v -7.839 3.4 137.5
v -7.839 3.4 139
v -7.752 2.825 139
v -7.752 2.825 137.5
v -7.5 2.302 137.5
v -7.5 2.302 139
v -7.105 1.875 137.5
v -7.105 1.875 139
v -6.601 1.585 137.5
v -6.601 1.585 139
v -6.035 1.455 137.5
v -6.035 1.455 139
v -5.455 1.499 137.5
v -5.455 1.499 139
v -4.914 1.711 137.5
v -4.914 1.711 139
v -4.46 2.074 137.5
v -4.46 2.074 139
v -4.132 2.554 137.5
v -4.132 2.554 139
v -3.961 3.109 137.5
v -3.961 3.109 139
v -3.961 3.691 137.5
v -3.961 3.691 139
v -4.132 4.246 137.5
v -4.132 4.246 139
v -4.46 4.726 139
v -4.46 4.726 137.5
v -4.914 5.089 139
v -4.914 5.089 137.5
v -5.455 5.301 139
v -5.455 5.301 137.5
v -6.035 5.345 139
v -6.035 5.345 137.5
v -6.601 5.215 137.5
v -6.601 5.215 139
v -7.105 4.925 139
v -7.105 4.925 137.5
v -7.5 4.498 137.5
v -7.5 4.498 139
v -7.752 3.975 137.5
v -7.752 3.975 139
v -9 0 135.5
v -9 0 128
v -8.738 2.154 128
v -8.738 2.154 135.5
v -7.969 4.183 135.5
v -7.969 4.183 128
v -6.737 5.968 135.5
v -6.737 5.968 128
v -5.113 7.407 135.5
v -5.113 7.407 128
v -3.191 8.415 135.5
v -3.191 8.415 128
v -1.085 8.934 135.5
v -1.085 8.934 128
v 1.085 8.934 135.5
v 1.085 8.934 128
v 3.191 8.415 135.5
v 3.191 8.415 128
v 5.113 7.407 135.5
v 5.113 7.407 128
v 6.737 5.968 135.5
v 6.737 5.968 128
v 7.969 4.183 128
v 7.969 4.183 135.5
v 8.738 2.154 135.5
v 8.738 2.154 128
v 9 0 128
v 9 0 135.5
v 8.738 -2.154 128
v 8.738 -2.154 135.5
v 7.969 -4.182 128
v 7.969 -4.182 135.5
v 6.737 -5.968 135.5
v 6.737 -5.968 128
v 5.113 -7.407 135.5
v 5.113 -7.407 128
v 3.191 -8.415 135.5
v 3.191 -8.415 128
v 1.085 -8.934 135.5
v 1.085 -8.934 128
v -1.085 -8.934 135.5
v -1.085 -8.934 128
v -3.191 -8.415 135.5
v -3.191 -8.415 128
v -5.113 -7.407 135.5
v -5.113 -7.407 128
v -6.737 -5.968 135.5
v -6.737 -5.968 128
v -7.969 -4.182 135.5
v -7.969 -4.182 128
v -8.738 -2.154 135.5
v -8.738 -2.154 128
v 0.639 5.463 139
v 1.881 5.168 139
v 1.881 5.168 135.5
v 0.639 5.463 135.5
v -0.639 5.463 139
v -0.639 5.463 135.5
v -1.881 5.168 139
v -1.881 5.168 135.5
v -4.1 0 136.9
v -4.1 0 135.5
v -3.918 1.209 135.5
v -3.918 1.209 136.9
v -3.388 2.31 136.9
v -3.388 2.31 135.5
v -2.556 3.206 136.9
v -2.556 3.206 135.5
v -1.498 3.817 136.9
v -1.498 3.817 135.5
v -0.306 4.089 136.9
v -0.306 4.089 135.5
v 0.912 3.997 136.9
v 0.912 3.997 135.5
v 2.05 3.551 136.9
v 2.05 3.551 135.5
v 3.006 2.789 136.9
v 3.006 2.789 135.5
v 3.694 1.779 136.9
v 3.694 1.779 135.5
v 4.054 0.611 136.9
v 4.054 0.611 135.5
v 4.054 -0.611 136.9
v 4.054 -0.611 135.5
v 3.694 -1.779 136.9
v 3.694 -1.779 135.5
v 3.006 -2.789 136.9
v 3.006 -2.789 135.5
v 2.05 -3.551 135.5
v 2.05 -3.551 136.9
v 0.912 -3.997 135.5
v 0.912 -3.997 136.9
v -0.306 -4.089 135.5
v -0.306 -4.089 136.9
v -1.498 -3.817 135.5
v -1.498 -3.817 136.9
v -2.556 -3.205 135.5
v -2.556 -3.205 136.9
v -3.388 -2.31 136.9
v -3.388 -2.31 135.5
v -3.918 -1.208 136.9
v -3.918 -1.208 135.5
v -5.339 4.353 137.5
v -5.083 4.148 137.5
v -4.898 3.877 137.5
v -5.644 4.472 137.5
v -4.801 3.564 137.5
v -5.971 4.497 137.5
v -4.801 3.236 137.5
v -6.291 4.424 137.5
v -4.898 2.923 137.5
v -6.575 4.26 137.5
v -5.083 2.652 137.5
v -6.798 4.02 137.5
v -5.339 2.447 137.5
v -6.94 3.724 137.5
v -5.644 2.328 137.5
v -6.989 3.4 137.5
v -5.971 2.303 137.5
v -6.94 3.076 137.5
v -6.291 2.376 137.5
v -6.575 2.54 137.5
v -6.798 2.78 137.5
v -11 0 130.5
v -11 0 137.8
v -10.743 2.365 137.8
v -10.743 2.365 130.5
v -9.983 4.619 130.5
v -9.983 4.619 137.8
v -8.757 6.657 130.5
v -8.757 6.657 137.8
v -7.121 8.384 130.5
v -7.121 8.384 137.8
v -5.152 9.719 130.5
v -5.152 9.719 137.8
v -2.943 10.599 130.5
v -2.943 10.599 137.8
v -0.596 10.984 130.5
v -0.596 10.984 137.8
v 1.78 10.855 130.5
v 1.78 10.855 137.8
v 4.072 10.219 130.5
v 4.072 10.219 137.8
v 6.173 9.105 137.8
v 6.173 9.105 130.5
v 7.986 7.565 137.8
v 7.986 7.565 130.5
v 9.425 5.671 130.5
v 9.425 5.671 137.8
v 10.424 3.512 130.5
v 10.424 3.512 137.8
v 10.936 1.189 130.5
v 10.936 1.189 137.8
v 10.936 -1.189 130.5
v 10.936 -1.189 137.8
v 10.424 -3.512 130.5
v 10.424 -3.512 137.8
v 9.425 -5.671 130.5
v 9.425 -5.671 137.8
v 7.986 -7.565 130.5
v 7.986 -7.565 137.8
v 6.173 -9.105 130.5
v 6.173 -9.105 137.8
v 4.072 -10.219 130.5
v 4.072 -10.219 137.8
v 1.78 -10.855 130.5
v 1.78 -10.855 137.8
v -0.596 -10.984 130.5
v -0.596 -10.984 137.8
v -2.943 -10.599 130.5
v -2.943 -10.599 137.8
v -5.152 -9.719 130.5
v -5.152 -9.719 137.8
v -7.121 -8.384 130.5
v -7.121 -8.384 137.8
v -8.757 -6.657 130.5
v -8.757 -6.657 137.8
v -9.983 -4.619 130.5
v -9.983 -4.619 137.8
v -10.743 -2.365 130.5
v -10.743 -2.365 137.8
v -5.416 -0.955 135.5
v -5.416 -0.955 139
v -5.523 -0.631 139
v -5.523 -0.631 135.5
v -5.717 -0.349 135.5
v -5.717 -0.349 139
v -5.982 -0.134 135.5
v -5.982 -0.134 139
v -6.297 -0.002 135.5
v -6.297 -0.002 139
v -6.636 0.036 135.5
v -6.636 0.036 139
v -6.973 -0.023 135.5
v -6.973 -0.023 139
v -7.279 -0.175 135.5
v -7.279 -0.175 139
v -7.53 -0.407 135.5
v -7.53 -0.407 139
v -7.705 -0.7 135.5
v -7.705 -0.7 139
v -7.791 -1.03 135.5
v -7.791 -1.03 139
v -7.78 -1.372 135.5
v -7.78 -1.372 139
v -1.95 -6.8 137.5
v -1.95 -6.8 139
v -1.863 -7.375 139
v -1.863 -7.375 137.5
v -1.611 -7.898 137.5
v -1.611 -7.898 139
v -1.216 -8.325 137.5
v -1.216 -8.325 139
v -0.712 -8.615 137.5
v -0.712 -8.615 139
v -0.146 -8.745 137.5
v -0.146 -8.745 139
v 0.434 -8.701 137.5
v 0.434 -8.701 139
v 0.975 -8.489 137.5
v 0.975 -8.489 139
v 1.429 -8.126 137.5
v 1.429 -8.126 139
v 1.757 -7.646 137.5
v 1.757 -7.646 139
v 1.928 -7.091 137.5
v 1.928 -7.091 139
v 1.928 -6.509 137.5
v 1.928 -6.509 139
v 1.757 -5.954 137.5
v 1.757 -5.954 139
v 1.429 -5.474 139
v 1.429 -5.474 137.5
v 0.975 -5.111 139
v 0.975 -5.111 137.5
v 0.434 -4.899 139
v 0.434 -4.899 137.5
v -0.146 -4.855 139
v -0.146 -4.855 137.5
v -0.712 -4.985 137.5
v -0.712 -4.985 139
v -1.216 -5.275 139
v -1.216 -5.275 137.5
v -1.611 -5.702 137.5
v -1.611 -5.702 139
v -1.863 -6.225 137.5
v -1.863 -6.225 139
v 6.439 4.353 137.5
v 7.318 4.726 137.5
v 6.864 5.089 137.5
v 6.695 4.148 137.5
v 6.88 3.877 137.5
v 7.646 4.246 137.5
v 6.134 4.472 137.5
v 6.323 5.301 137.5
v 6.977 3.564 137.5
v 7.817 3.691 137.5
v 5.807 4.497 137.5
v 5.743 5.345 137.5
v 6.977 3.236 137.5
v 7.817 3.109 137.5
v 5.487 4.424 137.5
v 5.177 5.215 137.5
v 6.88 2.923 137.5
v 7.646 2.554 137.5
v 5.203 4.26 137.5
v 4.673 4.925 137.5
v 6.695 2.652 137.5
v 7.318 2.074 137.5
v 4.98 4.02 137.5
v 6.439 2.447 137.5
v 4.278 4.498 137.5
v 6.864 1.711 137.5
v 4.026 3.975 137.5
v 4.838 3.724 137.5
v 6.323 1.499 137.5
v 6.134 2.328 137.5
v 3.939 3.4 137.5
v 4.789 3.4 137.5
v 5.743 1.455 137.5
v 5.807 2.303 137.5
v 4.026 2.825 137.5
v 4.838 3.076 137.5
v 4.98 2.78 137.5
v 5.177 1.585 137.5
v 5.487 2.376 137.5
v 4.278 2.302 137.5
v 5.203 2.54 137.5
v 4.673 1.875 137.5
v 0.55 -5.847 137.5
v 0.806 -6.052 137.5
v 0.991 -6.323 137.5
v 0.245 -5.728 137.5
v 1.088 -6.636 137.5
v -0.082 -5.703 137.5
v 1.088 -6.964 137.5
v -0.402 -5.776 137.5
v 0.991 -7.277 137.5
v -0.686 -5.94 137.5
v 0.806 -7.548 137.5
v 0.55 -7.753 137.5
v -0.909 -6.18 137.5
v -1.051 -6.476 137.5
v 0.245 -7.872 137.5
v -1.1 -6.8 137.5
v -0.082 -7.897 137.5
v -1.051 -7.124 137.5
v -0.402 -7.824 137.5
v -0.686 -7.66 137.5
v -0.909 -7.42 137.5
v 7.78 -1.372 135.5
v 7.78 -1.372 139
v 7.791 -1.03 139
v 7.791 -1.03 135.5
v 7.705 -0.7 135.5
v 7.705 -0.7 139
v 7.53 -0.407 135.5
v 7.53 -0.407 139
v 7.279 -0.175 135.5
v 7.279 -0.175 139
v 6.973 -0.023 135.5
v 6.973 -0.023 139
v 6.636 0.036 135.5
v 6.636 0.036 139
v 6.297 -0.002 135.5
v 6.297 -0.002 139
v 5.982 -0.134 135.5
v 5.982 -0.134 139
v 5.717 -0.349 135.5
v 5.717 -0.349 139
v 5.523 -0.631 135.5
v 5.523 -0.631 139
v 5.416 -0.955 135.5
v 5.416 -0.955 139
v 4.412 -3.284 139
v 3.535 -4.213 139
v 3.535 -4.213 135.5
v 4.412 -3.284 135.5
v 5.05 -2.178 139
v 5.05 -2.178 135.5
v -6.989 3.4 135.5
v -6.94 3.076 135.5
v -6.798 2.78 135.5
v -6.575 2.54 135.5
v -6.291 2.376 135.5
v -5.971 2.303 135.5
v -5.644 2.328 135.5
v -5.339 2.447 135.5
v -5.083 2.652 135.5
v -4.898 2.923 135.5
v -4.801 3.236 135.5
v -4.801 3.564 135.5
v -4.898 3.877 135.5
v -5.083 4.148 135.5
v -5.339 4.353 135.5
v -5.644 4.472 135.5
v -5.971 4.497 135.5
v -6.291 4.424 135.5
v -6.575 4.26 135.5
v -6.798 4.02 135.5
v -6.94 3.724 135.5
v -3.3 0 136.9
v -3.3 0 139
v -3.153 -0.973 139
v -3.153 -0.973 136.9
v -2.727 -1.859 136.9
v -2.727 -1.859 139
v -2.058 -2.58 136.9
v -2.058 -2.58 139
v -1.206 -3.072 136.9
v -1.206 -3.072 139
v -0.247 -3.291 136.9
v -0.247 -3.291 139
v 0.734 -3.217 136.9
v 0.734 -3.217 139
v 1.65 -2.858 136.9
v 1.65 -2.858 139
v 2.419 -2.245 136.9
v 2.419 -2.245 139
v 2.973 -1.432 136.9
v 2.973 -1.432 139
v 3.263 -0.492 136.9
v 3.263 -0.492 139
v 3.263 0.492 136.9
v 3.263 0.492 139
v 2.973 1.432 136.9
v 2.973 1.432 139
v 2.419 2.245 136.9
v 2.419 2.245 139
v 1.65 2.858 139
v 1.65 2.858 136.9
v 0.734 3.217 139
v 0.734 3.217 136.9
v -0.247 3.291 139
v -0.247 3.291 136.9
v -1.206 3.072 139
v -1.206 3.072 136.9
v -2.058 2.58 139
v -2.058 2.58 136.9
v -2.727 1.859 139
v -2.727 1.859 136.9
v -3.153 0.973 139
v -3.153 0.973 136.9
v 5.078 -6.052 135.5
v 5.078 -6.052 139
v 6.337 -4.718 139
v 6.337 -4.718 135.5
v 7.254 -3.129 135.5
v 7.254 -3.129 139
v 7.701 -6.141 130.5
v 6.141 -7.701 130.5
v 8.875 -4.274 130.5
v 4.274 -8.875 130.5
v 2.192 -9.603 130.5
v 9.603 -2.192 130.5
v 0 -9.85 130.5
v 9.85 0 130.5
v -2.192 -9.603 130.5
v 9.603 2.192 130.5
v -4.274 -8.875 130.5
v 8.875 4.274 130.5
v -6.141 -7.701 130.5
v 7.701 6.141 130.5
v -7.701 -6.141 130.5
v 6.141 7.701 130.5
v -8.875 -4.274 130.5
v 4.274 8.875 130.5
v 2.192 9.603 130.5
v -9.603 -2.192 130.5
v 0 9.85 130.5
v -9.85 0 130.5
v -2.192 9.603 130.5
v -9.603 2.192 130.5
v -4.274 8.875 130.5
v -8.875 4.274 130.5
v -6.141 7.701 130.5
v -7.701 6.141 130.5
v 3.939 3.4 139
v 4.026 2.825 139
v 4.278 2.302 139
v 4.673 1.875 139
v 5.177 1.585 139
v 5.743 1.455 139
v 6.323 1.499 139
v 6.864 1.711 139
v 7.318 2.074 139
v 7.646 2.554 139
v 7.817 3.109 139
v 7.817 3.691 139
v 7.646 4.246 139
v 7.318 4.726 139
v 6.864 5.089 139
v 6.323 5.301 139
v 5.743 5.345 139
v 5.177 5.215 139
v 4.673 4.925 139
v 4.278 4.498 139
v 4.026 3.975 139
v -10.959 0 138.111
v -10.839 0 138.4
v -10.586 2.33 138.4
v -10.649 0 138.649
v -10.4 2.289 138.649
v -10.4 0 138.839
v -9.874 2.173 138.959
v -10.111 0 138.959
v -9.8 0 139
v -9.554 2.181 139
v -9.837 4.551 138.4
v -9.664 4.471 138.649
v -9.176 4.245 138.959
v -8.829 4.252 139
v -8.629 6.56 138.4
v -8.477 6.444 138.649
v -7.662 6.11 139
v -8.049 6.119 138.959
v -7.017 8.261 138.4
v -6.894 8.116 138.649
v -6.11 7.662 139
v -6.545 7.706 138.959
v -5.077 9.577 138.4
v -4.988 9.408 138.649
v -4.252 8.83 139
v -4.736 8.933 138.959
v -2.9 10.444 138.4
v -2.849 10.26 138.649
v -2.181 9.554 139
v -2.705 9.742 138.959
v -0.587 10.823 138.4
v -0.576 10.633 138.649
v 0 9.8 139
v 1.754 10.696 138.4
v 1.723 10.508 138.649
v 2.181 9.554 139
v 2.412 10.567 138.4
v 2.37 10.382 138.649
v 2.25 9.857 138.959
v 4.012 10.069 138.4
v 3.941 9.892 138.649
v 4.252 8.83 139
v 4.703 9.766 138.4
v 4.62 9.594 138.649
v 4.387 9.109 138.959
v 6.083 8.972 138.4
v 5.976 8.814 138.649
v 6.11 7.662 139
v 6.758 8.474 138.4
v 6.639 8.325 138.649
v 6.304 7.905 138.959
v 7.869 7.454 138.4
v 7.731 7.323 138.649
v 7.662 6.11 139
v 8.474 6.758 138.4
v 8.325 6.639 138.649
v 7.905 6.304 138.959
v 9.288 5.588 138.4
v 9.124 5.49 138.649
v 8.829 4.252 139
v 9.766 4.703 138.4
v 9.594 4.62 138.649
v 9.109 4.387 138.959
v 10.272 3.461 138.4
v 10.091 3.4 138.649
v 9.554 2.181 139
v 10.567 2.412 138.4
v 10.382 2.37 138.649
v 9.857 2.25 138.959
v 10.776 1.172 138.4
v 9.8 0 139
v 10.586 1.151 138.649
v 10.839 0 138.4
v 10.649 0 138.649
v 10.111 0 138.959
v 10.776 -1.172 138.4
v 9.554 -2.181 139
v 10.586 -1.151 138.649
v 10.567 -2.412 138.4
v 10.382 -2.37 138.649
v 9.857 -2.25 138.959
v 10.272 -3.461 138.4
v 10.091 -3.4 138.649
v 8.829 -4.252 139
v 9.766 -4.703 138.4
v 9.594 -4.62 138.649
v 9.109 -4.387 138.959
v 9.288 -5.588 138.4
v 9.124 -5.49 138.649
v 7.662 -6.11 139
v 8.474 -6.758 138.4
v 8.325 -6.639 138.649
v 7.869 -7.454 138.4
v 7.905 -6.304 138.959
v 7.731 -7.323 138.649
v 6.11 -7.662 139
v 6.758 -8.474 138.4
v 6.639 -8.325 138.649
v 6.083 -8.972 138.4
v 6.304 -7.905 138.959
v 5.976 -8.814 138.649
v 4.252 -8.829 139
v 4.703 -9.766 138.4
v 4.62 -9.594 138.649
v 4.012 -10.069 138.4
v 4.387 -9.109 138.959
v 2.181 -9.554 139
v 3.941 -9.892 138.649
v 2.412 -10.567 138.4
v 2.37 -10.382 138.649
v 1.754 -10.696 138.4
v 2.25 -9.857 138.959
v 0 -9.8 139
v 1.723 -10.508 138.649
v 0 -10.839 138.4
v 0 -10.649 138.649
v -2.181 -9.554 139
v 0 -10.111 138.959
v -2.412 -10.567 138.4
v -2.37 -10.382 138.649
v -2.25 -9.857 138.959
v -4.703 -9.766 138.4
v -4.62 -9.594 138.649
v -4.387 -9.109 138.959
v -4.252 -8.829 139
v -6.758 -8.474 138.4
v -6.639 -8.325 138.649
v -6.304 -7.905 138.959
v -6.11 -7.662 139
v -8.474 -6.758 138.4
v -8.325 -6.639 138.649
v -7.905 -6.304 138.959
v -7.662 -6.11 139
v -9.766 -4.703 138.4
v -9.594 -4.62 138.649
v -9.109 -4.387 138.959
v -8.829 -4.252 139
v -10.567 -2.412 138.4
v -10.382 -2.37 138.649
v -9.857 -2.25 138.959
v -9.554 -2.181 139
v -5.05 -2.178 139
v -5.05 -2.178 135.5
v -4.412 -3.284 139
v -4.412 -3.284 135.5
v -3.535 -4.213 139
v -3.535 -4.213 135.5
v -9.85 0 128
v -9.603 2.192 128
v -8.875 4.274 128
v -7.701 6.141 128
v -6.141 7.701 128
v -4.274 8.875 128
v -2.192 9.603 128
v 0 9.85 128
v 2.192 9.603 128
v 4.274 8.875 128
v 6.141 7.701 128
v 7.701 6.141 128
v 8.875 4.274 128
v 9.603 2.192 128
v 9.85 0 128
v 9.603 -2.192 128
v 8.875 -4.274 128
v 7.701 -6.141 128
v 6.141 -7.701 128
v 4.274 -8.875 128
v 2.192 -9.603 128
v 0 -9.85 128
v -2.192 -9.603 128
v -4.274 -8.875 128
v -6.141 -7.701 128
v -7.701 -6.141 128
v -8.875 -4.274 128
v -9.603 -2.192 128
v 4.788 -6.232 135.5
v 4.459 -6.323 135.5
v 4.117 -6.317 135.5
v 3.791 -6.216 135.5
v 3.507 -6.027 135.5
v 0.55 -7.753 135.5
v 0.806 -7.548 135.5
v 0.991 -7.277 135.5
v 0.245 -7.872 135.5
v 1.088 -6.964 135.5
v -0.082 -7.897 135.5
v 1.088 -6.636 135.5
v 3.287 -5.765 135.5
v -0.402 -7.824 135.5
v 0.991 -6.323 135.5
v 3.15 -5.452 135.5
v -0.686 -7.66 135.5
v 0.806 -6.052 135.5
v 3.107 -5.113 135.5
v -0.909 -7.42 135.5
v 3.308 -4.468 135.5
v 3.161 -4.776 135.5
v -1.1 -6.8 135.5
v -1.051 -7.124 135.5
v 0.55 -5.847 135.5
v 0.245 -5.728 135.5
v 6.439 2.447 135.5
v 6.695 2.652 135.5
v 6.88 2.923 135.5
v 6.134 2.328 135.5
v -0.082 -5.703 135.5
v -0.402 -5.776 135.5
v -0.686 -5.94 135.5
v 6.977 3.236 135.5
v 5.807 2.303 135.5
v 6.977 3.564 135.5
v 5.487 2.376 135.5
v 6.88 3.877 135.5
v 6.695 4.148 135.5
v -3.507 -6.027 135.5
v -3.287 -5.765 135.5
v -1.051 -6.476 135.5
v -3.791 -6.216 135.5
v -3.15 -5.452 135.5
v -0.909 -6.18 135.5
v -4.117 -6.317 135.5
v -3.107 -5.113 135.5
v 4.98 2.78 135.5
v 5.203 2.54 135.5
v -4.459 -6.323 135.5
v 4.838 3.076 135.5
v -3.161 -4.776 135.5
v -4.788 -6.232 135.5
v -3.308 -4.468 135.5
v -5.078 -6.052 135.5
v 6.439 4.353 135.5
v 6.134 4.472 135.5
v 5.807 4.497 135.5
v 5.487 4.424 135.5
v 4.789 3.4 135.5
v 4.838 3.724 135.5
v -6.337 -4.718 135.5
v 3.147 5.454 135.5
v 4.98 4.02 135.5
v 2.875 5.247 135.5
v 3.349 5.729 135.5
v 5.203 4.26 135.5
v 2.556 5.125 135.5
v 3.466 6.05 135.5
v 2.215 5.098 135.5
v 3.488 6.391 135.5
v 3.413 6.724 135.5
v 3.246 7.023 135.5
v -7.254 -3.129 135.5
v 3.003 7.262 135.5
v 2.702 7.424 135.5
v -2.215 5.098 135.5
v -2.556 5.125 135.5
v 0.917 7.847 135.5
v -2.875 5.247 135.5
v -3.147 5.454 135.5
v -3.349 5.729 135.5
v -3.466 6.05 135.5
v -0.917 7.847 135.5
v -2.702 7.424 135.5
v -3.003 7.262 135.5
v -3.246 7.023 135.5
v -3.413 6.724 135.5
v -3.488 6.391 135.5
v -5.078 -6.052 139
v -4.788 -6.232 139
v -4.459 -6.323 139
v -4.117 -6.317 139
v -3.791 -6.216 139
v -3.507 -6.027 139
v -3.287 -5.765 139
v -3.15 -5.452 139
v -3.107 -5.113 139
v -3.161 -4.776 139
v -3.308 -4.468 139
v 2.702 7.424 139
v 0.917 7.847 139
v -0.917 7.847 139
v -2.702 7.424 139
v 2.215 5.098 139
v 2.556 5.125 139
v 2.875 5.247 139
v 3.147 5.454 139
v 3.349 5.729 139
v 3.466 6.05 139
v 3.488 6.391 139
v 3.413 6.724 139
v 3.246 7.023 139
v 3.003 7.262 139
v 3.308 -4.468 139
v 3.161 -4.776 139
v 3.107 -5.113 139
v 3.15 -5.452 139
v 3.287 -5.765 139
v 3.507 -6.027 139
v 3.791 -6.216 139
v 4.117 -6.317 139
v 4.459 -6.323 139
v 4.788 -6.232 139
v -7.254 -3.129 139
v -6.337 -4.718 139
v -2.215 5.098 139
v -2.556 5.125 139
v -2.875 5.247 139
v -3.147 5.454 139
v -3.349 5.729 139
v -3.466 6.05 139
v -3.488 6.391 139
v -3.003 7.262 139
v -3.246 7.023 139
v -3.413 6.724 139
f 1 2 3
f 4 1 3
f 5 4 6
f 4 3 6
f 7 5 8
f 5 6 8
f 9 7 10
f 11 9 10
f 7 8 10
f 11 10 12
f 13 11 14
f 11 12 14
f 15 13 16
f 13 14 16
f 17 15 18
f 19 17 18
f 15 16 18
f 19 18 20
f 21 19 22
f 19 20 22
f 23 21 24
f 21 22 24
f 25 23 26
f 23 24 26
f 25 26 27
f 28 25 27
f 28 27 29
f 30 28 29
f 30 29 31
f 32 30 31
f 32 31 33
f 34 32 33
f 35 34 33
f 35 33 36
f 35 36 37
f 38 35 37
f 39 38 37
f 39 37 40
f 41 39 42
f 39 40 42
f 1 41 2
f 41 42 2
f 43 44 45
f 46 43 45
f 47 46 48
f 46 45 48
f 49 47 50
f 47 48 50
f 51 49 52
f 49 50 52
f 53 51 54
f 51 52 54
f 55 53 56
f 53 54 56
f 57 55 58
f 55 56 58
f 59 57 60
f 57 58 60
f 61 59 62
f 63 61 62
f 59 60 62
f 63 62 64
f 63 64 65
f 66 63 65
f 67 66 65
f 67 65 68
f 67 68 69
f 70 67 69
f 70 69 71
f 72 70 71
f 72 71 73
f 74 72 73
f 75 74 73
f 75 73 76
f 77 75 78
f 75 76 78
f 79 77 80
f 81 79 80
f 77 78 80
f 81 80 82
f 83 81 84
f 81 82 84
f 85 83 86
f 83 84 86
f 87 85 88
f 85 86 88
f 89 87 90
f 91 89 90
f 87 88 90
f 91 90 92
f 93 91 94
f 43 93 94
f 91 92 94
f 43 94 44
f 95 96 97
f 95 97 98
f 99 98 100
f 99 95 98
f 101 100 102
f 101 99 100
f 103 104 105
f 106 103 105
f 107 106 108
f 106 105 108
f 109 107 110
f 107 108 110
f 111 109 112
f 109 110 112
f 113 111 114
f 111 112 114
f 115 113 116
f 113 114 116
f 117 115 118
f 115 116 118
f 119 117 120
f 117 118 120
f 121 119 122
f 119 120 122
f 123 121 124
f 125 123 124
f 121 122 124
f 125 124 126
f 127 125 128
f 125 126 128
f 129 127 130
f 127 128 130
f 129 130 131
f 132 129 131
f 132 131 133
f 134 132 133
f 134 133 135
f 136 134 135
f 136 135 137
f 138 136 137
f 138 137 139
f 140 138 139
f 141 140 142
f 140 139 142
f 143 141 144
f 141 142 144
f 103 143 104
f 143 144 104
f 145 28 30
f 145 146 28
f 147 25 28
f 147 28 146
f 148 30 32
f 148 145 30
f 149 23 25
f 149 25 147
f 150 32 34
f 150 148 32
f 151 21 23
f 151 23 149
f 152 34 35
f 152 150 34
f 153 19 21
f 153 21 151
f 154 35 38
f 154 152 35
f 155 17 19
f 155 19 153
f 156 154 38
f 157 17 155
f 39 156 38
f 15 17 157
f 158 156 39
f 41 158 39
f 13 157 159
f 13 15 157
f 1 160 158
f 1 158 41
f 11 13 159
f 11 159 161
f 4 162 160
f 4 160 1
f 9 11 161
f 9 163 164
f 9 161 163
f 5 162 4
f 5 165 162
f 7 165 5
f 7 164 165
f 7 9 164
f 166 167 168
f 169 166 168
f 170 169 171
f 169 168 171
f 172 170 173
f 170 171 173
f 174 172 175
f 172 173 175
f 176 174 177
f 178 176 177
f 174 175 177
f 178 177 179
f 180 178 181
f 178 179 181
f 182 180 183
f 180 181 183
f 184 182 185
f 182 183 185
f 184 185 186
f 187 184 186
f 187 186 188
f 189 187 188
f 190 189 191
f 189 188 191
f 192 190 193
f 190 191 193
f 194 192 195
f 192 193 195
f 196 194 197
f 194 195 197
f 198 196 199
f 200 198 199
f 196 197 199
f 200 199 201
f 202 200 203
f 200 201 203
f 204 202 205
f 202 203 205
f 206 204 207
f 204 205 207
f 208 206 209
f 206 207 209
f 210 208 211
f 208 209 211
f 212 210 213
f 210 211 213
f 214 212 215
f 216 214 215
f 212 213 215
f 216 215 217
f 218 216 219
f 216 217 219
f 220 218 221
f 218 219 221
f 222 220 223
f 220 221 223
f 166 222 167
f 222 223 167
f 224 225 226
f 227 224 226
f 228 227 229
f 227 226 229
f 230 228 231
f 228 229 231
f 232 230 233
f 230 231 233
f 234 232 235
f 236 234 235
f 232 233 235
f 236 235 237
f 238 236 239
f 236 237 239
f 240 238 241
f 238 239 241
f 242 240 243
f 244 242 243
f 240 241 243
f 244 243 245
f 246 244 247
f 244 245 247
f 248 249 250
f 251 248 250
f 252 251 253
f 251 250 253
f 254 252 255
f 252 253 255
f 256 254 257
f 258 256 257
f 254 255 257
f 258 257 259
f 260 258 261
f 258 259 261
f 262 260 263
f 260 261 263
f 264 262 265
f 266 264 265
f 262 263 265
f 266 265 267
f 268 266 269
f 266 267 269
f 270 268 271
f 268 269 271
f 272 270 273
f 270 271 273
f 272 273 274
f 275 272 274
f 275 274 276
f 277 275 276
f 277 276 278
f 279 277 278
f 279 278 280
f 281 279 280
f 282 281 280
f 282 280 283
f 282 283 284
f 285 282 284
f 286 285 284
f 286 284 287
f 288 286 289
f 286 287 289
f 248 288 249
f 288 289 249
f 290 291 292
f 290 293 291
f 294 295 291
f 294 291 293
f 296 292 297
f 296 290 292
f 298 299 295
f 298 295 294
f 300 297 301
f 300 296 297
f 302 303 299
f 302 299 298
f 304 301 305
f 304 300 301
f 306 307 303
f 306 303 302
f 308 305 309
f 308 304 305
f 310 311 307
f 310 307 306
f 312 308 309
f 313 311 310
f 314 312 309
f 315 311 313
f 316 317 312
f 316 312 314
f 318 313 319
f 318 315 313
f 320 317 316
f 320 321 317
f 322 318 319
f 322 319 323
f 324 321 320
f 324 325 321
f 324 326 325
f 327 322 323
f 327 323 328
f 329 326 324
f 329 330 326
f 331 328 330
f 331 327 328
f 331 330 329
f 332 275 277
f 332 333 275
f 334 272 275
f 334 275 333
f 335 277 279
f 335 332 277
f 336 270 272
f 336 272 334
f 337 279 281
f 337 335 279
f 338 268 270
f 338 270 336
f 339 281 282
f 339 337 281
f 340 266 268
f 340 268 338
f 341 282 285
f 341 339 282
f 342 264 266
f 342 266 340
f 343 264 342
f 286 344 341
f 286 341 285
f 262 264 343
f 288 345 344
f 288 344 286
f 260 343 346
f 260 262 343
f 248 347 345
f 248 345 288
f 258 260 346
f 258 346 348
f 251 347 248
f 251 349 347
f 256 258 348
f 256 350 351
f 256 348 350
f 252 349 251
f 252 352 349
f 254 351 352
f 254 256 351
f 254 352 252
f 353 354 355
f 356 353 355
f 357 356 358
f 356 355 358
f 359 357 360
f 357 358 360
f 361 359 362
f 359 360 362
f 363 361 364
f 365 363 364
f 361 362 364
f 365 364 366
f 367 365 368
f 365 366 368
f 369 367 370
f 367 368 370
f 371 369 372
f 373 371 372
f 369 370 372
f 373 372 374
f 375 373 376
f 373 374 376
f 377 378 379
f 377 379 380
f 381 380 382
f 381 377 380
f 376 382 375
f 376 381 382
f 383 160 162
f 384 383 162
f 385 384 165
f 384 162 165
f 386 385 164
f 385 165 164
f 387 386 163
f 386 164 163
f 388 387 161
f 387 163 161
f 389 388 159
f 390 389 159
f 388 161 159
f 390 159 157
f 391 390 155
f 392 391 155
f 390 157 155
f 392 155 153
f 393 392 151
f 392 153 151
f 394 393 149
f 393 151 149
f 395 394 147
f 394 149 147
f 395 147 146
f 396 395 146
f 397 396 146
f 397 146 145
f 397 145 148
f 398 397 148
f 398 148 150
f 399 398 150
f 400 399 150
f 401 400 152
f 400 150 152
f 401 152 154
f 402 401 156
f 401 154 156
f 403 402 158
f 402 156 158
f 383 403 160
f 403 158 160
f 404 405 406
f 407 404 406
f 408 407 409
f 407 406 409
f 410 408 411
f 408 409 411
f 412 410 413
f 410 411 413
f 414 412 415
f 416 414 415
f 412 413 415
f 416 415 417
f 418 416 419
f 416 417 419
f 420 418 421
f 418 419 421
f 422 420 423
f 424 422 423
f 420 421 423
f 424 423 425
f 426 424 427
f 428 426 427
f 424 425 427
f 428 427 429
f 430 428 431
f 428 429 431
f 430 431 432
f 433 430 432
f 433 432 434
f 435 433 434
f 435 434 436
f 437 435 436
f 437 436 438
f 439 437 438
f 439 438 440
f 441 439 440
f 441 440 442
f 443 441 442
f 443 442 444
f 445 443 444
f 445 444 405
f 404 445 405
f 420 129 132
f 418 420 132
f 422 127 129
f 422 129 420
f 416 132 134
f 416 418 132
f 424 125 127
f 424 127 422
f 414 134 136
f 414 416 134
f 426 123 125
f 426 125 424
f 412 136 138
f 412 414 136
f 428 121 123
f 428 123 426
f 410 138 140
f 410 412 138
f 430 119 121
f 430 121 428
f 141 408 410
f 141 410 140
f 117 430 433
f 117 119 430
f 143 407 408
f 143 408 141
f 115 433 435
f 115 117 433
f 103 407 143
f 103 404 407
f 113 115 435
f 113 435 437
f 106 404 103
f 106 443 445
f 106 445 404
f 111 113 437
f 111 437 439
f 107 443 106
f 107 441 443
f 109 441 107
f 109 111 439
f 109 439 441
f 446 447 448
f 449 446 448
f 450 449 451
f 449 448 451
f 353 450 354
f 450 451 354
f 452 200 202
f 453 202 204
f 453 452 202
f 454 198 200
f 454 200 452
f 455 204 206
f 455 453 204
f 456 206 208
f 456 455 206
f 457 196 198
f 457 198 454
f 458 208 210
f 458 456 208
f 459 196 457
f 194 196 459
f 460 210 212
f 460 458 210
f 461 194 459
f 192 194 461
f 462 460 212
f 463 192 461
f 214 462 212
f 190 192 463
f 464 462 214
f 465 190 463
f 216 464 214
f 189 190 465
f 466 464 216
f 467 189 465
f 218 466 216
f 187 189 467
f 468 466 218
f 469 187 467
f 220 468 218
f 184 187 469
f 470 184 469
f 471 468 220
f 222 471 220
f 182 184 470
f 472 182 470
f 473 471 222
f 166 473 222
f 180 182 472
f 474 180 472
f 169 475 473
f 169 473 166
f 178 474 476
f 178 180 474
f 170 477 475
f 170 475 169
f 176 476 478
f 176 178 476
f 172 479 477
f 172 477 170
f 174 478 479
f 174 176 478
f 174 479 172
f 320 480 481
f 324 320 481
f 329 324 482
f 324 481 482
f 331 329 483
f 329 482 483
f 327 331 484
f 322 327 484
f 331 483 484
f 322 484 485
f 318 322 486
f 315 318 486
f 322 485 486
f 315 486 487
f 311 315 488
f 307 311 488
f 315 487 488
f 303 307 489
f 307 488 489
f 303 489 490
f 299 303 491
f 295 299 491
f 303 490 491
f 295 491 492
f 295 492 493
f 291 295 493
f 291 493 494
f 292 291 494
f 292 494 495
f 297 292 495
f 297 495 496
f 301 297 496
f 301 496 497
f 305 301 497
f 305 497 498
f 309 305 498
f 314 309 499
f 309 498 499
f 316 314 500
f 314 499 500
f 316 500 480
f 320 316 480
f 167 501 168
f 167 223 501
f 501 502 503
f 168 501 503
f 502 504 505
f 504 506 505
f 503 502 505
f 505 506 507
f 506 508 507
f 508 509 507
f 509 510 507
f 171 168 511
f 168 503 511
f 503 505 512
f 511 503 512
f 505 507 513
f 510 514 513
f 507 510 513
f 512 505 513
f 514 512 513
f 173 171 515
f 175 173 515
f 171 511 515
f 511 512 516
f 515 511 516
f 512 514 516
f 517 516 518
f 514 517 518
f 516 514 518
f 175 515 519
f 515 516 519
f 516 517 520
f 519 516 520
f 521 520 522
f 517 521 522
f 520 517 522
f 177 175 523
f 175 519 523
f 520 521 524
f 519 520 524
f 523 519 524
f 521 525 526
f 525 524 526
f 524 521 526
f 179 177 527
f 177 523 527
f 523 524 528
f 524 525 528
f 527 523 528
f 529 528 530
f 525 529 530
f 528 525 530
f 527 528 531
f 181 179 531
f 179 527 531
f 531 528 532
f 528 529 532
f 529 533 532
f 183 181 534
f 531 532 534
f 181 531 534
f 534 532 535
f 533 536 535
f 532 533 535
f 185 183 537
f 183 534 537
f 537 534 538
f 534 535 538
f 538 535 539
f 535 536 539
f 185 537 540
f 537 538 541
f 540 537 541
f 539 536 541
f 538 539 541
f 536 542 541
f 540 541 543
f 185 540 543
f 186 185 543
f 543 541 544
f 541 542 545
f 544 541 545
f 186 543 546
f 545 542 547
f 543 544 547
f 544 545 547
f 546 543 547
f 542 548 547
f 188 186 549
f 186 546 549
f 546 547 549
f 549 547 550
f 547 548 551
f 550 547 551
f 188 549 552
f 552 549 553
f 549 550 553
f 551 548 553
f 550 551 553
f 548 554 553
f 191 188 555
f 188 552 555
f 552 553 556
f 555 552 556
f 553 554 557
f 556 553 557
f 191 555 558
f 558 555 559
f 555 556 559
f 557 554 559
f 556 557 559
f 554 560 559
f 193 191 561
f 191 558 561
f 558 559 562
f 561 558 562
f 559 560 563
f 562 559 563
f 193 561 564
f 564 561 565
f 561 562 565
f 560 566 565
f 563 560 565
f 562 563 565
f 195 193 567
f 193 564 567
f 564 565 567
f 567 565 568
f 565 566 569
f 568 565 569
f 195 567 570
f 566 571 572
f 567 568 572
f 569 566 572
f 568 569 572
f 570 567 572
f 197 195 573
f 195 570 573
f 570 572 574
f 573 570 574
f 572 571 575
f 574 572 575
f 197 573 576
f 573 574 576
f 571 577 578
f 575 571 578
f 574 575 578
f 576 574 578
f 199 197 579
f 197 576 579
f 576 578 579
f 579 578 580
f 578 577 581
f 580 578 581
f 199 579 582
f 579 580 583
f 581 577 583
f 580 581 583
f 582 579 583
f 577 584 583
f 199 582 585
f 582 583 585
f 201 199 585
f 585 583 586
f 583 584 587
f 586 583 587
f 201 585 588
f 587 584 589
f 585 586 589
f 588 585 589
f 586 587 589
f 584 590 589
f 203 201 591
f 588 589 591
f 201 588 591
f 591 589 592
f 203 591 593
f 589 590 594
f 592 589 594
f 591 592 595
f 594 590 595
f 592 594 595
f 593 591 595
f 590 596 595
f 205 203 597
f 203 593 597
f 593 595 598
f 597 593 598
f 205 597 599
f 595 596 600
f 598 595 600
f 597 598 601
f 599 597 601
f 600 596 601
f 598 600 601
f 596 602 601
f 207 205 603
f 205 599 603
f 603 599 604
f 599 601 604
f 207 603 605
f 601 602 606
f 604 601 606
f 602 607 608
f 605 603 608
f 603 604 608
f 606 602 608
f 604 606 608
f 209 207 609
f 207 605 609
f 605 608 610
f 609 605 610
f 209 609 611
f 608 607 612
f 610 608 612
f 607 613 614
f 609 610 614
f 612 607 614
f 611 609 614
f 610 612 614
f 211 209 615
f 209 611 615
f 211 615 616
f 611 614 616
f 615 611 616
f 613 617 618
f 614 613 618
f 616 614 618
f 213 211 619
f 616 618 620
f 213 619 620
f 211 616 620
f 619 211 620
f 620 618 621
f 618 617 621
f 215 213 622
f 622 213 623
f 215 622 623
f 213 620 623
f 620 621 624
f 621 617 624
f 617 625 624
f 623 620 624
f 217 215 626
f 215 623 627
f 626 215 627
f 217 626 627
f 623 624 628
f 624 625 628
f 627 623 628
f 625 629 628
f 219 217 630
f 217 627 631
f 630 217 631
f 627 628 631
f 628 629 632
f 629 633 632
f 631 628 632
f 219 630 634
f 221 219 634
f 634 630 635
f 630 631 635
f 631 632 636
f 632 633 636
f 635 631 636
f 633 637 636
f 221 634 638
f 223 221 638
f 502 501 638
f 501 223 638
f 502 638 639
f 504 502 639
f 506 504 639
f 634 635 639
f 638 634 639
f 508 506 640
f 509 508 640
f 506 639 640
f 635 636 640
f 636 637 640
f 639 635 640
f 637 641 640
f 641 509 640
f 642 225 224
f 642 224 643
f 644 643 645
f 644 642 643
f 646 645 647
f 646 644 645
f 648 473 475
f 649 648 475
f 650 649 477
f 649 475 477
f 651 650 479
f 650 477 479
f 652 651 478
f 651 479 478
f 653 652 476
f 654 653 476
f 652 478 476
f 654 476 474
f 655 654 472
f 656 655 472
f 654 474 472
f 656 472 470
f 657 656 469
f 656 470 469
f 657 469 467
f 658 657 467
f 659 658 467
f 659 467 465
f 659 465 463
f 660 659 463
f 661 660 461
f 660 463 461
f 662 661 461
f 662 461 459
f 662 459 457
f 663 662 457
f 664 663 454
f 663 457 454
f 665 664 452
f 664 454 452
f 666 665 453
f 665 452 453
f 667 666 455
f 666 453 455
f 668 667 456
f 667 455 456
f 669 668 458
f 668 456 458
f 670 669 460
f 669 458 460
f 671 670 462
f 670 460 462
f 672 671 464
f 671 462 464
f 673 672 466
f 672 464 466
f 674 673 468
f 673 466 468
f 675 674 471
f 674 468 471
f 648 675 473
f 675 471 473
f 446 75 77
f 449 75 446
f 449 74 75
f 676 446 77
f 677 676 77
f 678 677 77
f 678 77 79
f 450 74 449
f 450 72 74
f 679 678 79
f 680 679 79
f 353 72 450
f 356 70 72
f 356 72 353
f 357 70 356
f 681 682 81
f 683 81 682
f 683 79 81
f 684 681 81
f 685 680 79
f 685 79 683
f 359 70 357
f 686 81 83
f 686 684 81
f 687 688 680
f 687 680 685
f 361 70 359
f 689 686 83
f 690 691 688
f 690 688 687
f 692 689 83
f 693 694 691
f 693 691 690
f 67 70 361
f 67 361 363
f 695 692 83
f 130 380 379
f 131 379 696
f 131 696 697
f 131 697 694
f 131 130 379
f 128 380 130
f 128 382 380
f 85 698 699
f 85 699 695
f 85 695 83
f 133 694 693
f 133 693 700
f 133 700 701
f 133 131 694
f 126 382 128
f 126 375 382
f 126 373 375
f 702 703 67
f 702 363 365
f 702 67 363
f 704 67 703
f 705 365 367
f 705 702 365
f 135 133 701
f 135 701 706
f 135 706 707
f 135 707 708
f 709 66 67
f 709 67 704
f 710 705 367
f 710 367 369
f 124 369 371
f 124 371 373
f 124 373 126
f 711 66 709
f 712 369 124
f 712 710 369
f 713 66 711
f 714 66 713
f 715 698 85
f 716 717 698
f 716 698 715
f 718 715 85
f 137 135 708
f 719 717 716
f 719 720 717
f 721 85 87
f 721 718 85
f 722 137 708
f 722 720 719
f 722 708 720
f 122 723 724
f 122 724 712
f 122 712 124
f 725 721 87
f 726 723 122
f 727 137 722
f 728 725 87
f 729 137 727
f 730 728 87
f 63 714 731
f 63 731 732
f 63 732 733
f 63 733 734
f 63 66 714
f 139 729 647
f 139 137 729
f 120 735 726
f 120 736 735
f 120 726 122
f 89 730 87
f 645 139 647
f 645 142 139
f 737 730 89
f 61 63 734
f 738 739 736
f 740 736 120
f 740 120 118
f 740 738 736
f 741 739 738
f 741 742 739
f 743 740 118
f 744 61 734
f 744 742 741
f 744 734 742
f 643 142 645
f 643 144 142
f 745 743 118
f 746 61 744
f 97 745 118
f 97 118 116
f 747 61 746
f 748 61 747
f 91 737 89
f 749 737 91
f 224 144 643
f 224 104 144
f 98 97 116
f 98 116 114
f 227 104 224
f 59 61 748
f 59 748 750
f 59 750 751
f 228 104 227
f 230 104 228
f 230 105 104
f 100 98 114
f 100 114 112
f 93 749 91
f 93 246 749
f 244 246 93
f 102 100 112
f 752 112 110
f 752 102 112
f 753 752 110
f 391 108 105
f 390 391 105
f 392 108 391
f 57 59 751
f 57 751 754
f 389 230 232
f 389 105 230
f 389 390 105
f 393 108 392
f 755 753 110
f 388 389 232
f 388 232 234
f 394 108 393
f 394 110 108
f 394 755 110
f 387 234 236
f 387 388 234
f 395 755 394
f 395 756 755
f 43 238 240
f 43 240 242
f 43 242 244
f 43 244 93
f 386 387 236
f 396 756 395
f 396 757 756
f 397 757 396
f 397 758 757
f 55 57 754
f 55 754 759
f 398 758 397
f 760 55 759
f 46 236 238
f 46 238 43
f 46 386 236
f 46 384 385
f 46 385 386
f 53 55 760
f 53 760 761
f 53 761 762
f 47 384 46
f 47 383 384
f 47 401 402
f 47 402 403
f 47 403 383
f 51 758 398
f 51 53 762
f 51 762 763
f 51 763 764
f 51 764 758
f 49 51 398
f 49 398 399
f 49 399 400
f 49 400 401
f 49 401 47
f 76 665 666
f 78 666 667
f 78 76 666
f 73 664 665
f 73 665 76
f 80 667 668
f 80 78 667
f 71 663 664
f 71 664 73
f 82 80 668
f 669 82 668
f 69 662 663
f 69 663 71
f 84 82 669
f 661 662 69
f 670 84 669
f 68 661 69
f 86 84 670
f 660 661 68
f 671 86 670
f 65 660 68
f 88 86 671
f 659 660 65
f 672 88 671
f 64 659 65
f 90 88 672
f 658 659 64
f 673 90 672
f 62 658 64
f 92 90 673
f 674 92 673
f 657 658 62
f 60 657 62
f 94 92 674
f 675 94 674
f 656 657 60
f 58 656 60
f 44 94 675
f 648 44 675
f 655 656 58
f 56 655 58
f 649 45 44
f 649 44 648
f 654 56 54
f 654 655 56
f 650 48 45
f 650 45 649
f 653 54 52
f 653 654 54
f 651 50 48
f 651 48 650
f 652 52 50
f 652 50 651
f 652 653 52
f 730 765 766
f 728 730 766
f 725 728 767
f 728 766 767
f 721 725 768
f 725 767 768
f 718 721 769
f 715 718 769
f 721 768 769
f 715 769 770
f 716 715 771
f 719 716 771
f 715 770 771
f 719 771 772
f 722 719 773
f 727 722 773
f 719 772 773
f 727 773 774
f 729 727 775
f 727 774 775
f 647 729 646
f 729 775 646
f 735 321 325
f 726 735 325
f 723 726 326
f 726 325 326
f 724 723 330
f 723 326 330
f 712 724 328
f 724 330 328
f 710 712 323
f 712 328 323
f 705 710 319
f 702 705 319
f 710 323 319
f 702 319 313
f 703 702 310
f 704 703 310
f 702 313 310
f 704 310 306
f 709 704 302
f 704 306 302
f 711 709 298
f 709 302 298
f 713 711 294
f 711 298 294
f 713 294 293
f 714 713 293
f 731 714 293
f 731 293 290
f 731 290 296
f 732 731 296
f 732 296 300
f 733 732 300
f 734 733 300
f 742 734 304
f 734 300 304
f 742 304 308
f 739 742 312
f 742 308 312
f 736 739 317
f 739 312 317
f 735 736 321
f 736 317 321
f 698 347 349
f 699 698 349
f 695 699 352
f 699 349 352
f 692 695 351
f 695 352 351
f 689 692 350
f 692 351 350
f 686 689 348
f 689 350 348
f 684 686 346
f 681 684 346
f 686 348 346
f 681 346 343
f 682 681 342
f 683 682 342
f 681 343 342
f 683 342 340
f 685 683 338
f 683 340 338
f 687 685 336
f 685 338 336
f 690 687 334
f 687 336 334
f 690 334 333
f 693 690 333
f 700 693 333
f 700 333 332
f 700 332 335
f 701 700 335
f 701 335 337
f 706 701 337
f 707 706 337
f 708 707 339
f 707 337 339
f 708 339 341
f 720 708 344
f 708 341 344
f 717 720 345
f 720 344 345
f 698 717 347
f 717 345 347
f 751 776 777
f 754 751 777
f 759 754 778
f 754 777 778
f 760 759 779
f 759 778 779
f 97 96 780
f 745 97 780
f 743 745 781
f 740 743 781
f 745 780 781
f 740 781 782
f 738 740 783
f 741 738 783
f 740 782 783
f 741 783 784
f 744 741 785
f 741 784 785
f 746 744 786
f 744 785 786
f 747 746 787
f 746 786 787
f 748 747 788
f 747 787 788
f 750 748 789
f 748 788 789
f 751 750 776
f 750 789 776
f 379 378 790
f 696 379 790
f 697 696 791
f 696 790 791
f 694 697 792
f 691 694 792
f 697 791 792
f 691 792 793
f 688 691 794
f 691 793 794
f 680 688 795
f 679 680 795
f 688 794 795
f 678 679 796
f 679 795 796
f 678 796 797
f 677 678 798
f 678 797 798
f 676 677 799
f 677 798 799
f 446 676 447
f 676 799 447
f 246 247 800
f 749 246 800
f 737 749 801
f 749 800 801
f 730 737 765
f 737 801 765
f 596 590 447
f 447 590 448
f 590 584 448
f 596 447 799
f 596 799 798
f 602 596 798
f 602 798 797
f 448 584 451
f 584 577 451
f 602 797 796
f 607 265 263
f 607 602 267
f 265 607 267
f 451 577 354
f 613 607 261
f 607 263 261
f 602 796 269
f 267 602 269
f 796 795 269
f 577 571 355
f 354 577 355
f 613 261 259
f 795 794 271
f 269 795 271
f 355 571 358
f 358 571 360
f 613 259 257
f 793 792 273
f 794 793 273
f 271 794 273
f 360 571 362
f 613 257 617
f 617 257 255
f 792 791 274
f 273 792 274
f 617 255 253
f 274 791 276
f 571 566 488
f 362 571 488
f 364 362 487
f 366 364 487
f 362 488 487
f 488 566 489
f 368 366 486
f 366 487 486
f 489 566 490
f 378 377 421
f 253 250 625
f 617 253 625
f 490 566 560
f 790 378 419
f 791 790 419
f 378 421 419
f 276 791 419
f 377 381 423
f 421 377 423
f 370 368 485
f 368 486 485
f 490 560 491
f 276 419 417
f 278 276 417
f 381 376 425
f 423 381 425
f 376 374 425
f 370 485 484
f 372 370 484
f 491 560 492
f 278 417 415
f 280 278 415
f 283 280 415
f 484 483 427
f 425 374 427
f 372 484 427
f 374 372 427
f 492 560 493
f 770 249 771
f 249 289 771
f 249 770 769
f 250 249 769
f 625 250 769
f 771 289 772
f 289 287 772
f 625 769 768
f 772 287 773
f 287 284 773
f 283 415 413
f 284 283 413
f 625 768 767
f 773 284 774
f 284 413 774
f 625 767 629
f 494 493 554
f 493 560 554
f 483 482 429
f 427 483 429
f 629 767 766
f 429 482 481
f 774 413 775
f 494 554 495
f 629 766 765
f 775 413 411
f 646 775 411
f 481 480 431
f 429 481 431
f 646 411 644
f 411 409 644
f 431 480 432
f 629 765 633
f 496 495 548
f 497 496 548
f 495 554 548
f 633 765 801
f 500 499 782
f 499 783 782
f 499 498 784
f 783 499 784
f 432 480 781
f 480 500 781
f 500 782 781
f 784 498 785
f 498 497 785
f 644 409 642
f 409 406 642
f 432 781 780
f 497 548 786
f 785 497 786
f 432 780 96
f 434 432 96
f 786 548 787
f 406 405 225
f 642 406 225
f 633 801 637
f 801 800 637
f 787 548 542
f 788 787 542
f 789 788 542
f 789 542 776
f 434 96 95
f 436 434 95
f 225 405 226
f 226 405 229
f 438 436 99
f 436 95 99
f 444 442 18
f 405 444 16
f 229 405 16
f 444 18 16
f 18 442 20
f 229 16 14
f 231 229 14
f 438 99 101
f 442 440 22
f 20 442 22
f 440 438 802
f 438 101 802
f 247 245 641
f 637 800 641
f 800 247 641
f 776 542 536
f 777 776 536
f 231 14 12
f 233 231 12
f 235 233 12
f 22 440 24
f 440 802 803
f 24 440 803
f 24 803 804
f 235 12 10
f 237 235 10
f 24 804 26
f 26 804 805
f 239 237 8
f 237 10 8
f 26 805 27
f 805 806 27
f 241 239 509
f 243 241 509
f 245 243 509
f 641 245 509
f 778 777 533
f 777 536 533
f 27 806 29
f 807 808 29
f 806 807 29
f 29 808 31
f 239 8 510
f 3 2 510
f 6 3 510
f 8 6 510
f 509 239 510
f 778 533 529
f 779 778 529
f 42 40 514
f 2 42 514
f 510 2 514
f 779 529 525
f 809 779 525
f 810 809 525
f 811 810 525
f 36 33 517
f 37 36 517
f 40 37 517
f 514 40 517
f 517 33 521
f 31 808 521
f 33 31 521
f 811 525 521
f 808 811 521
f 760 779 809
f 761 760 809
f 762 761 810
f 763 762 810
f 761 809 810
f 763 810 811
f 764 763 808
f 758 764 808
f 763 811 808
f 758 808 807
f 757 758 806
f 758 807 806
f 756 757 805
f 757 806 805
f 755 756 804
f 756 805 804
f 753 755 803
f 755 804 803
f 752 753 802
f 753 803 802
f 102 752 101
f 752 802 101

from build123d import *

# Parameters (mm, degrees)
SKETCH030_R             = 11
PAD011_DEPTH            = 8.5
SKETCH031_R             = 9.85
PAD012_DEPTH            = 2.5
SKETCH032_R             = 9
POCKET019_DEPTH         = 7.5
SKETCH033_R             = 1.95
POCKET020_DEPTH         = 1.5
FILLET010_R             = 1.2
SKETCH034_R             = 1.1
POCKET021_DEPTH         = 2
SKETCH035_R             = 3.3
POCKET022_DEPTH         = 3.5
SKETCH036_R             = 4.1
POCKET023_DEPTH         = 1.4
BODY011_PLACEMENT_ANGLE = 180.00001


with BuildPart() as part:
    # Sketch030 → Pad011 (new body)
    with BuildSketch(Plane.XY):
        Circle(SKETCH030_R)
    extrude(amount=PAD011_DEPTH)

    # Sketch031 (on Face3 of Pad011) → Pad012 (join)
    with BuildSketch(Plane.XY.offset(8.5)):
        Circle(SKETCH031_R)
    extrude(amount=PAD012_DEPTH)

    # Sketch032 (on Face5 of Pad012) → Pocket019 (cut)
    with BuildSketch(Plane.XY.offset(11)):
        Circle(SKETCH032_R)
    extrude(amount=-POCKET019_DEPTH, mode=Mode.SUBTRACT)

    # Sketch033 (on Face2 of Pocket019) → Pocket020 (cut)
    with BuildSketch(Plane(origin=(0, 0, 0), x_dir=(1, 0, 0), z_dir=(0, 0, -1))):
        with Locations((0, 6.8)):
            Circle(SKETCH033_R)
        with Locations((-5.8889727457, -3.4)):
            Circle(SKETCH033_R)
        with Locations((5.8889727457, -3.4)):
            Circle(SKETCH033_R)
    extrude(amount=-POCKET020_DEPTH, mode=Mode.SUBTRACT)

    # Fillet010
    fillet010_edges = [part.edges().sort_by_distance(p)[0] for p in [
        (-11, 0, 0),
    ]]
    fillet(fillet010_edges, radius=FILLET010_R)

    # Sketch034 (on Face11 of Fillet010) → Pocket021 (cut)
    with BuildSketch(Plane(origin=(0, 0, 1.5), x_dir=(1, 0, 0), z_dir=(0, 0, -1))):
        with Locations((-5.8889727457, -3.4)):
            Circle(SKETCH034_R)
        with Locations((0, 6.8)):
            Circle(SKETCH034_R)
        with Locations((5.8889727457, -3.4)):
            Circle(SKETCH034_R)
    extrude(amount=-POCKET021_DEPTH, mode=Mode.SUBTRACT)

    # Sketch035 (on Face4 of Pocket021) → Pocket022 (cut)
    with BuildSketch(Plane(origin=(0, 0, 0), x_dir=(1, 0, 0), z_dir=(0, 0, -1))):
        Circle(SKETCH035_R)
        with BuildLine():
            ThreePointArc((-3.5353318533, 4.2132444372), (-3.3874236532, 5.9038429005), (-5.0780221165, 6.0517511006))
            ThreePointArc((-5.0780221165, 6.0517511006), (-6.8416006899, 3.95), (-7.7799812488, 1.3718206036))
            ThreePointArc((-7.7799812488, 1.3718206036), (-6.8065897584, -0.0183265132), (-5.4164426416, 0.9550649772))
            ThreePointArc((-3.5353318533, 4.2132444372), (-4.7631397208, 2.75), (-5.4164426416, 0.9550649772))
        make_face()
        with BuildLine():
            ThreePointArc((5.0780221165, 6.0517511006), (3.3874236532, 5.9038429005), (3.5353318533, 4.2132444372))
            ThreePointArc((5.4164426416, 0.9550649772), (4.7631397208, 2.75), (3.5353318533, 4.2132444372))
            ThreePointArc((5.4164426416, 0.9550649772), (6.8065897584, -0.0183265132), (7.7799812488, 1.3718206036))
            ThreePointArc((7.7799812488, 1.3718206036), (6.8416006899, 3.95), (5.0780221165, 6.0517511006))
        make_face()
        with BuildLine():
            ThreePointArc((-1.8811107883, -5.1683094143), (-3.4191661052, -5.8855163873), (-2.7019591323, -7.4235717042))
            ThreePointArc((-2.7019591323, -7.4235717042), (0, -7.9), (2.7019591323, -7.4235717042))
            ThreePointArc((2.7019591323, -7.4235717042), (3.4191661052, -5.8855163873), (1.8811107883, -5.1683094143))
            ThreePointArc((-1.8811107883, -5.1683094143), (0, -5.5), (1.8811107883, -5.1683094143))
        make_face()
    extrude(amount=-POCKET022_DEPTH, mode=Mode.SUBTRACT)

    # Sketch036 (on Face23 of Pocket022) → Pocket023 (cut)
    with BuildSketch(Plane.XY.offset(3.5)):
        Circle(SKETCH036_R)
    extrude(amount=-POCKET023_DEPTH, mode=Mode.SUBTRACT)


with BuildPart() as part_1:
    # Body011 placement: moved
    add(part.part.moved(Location((2.3918e-06, 1e-05, 139.00003))).rotate(Axis((2.3918e-06, 1e-05, 139.00003), (0, 1, 0)), BODY011_PLACEMENT_ANGLE))


solid = part_1.part
